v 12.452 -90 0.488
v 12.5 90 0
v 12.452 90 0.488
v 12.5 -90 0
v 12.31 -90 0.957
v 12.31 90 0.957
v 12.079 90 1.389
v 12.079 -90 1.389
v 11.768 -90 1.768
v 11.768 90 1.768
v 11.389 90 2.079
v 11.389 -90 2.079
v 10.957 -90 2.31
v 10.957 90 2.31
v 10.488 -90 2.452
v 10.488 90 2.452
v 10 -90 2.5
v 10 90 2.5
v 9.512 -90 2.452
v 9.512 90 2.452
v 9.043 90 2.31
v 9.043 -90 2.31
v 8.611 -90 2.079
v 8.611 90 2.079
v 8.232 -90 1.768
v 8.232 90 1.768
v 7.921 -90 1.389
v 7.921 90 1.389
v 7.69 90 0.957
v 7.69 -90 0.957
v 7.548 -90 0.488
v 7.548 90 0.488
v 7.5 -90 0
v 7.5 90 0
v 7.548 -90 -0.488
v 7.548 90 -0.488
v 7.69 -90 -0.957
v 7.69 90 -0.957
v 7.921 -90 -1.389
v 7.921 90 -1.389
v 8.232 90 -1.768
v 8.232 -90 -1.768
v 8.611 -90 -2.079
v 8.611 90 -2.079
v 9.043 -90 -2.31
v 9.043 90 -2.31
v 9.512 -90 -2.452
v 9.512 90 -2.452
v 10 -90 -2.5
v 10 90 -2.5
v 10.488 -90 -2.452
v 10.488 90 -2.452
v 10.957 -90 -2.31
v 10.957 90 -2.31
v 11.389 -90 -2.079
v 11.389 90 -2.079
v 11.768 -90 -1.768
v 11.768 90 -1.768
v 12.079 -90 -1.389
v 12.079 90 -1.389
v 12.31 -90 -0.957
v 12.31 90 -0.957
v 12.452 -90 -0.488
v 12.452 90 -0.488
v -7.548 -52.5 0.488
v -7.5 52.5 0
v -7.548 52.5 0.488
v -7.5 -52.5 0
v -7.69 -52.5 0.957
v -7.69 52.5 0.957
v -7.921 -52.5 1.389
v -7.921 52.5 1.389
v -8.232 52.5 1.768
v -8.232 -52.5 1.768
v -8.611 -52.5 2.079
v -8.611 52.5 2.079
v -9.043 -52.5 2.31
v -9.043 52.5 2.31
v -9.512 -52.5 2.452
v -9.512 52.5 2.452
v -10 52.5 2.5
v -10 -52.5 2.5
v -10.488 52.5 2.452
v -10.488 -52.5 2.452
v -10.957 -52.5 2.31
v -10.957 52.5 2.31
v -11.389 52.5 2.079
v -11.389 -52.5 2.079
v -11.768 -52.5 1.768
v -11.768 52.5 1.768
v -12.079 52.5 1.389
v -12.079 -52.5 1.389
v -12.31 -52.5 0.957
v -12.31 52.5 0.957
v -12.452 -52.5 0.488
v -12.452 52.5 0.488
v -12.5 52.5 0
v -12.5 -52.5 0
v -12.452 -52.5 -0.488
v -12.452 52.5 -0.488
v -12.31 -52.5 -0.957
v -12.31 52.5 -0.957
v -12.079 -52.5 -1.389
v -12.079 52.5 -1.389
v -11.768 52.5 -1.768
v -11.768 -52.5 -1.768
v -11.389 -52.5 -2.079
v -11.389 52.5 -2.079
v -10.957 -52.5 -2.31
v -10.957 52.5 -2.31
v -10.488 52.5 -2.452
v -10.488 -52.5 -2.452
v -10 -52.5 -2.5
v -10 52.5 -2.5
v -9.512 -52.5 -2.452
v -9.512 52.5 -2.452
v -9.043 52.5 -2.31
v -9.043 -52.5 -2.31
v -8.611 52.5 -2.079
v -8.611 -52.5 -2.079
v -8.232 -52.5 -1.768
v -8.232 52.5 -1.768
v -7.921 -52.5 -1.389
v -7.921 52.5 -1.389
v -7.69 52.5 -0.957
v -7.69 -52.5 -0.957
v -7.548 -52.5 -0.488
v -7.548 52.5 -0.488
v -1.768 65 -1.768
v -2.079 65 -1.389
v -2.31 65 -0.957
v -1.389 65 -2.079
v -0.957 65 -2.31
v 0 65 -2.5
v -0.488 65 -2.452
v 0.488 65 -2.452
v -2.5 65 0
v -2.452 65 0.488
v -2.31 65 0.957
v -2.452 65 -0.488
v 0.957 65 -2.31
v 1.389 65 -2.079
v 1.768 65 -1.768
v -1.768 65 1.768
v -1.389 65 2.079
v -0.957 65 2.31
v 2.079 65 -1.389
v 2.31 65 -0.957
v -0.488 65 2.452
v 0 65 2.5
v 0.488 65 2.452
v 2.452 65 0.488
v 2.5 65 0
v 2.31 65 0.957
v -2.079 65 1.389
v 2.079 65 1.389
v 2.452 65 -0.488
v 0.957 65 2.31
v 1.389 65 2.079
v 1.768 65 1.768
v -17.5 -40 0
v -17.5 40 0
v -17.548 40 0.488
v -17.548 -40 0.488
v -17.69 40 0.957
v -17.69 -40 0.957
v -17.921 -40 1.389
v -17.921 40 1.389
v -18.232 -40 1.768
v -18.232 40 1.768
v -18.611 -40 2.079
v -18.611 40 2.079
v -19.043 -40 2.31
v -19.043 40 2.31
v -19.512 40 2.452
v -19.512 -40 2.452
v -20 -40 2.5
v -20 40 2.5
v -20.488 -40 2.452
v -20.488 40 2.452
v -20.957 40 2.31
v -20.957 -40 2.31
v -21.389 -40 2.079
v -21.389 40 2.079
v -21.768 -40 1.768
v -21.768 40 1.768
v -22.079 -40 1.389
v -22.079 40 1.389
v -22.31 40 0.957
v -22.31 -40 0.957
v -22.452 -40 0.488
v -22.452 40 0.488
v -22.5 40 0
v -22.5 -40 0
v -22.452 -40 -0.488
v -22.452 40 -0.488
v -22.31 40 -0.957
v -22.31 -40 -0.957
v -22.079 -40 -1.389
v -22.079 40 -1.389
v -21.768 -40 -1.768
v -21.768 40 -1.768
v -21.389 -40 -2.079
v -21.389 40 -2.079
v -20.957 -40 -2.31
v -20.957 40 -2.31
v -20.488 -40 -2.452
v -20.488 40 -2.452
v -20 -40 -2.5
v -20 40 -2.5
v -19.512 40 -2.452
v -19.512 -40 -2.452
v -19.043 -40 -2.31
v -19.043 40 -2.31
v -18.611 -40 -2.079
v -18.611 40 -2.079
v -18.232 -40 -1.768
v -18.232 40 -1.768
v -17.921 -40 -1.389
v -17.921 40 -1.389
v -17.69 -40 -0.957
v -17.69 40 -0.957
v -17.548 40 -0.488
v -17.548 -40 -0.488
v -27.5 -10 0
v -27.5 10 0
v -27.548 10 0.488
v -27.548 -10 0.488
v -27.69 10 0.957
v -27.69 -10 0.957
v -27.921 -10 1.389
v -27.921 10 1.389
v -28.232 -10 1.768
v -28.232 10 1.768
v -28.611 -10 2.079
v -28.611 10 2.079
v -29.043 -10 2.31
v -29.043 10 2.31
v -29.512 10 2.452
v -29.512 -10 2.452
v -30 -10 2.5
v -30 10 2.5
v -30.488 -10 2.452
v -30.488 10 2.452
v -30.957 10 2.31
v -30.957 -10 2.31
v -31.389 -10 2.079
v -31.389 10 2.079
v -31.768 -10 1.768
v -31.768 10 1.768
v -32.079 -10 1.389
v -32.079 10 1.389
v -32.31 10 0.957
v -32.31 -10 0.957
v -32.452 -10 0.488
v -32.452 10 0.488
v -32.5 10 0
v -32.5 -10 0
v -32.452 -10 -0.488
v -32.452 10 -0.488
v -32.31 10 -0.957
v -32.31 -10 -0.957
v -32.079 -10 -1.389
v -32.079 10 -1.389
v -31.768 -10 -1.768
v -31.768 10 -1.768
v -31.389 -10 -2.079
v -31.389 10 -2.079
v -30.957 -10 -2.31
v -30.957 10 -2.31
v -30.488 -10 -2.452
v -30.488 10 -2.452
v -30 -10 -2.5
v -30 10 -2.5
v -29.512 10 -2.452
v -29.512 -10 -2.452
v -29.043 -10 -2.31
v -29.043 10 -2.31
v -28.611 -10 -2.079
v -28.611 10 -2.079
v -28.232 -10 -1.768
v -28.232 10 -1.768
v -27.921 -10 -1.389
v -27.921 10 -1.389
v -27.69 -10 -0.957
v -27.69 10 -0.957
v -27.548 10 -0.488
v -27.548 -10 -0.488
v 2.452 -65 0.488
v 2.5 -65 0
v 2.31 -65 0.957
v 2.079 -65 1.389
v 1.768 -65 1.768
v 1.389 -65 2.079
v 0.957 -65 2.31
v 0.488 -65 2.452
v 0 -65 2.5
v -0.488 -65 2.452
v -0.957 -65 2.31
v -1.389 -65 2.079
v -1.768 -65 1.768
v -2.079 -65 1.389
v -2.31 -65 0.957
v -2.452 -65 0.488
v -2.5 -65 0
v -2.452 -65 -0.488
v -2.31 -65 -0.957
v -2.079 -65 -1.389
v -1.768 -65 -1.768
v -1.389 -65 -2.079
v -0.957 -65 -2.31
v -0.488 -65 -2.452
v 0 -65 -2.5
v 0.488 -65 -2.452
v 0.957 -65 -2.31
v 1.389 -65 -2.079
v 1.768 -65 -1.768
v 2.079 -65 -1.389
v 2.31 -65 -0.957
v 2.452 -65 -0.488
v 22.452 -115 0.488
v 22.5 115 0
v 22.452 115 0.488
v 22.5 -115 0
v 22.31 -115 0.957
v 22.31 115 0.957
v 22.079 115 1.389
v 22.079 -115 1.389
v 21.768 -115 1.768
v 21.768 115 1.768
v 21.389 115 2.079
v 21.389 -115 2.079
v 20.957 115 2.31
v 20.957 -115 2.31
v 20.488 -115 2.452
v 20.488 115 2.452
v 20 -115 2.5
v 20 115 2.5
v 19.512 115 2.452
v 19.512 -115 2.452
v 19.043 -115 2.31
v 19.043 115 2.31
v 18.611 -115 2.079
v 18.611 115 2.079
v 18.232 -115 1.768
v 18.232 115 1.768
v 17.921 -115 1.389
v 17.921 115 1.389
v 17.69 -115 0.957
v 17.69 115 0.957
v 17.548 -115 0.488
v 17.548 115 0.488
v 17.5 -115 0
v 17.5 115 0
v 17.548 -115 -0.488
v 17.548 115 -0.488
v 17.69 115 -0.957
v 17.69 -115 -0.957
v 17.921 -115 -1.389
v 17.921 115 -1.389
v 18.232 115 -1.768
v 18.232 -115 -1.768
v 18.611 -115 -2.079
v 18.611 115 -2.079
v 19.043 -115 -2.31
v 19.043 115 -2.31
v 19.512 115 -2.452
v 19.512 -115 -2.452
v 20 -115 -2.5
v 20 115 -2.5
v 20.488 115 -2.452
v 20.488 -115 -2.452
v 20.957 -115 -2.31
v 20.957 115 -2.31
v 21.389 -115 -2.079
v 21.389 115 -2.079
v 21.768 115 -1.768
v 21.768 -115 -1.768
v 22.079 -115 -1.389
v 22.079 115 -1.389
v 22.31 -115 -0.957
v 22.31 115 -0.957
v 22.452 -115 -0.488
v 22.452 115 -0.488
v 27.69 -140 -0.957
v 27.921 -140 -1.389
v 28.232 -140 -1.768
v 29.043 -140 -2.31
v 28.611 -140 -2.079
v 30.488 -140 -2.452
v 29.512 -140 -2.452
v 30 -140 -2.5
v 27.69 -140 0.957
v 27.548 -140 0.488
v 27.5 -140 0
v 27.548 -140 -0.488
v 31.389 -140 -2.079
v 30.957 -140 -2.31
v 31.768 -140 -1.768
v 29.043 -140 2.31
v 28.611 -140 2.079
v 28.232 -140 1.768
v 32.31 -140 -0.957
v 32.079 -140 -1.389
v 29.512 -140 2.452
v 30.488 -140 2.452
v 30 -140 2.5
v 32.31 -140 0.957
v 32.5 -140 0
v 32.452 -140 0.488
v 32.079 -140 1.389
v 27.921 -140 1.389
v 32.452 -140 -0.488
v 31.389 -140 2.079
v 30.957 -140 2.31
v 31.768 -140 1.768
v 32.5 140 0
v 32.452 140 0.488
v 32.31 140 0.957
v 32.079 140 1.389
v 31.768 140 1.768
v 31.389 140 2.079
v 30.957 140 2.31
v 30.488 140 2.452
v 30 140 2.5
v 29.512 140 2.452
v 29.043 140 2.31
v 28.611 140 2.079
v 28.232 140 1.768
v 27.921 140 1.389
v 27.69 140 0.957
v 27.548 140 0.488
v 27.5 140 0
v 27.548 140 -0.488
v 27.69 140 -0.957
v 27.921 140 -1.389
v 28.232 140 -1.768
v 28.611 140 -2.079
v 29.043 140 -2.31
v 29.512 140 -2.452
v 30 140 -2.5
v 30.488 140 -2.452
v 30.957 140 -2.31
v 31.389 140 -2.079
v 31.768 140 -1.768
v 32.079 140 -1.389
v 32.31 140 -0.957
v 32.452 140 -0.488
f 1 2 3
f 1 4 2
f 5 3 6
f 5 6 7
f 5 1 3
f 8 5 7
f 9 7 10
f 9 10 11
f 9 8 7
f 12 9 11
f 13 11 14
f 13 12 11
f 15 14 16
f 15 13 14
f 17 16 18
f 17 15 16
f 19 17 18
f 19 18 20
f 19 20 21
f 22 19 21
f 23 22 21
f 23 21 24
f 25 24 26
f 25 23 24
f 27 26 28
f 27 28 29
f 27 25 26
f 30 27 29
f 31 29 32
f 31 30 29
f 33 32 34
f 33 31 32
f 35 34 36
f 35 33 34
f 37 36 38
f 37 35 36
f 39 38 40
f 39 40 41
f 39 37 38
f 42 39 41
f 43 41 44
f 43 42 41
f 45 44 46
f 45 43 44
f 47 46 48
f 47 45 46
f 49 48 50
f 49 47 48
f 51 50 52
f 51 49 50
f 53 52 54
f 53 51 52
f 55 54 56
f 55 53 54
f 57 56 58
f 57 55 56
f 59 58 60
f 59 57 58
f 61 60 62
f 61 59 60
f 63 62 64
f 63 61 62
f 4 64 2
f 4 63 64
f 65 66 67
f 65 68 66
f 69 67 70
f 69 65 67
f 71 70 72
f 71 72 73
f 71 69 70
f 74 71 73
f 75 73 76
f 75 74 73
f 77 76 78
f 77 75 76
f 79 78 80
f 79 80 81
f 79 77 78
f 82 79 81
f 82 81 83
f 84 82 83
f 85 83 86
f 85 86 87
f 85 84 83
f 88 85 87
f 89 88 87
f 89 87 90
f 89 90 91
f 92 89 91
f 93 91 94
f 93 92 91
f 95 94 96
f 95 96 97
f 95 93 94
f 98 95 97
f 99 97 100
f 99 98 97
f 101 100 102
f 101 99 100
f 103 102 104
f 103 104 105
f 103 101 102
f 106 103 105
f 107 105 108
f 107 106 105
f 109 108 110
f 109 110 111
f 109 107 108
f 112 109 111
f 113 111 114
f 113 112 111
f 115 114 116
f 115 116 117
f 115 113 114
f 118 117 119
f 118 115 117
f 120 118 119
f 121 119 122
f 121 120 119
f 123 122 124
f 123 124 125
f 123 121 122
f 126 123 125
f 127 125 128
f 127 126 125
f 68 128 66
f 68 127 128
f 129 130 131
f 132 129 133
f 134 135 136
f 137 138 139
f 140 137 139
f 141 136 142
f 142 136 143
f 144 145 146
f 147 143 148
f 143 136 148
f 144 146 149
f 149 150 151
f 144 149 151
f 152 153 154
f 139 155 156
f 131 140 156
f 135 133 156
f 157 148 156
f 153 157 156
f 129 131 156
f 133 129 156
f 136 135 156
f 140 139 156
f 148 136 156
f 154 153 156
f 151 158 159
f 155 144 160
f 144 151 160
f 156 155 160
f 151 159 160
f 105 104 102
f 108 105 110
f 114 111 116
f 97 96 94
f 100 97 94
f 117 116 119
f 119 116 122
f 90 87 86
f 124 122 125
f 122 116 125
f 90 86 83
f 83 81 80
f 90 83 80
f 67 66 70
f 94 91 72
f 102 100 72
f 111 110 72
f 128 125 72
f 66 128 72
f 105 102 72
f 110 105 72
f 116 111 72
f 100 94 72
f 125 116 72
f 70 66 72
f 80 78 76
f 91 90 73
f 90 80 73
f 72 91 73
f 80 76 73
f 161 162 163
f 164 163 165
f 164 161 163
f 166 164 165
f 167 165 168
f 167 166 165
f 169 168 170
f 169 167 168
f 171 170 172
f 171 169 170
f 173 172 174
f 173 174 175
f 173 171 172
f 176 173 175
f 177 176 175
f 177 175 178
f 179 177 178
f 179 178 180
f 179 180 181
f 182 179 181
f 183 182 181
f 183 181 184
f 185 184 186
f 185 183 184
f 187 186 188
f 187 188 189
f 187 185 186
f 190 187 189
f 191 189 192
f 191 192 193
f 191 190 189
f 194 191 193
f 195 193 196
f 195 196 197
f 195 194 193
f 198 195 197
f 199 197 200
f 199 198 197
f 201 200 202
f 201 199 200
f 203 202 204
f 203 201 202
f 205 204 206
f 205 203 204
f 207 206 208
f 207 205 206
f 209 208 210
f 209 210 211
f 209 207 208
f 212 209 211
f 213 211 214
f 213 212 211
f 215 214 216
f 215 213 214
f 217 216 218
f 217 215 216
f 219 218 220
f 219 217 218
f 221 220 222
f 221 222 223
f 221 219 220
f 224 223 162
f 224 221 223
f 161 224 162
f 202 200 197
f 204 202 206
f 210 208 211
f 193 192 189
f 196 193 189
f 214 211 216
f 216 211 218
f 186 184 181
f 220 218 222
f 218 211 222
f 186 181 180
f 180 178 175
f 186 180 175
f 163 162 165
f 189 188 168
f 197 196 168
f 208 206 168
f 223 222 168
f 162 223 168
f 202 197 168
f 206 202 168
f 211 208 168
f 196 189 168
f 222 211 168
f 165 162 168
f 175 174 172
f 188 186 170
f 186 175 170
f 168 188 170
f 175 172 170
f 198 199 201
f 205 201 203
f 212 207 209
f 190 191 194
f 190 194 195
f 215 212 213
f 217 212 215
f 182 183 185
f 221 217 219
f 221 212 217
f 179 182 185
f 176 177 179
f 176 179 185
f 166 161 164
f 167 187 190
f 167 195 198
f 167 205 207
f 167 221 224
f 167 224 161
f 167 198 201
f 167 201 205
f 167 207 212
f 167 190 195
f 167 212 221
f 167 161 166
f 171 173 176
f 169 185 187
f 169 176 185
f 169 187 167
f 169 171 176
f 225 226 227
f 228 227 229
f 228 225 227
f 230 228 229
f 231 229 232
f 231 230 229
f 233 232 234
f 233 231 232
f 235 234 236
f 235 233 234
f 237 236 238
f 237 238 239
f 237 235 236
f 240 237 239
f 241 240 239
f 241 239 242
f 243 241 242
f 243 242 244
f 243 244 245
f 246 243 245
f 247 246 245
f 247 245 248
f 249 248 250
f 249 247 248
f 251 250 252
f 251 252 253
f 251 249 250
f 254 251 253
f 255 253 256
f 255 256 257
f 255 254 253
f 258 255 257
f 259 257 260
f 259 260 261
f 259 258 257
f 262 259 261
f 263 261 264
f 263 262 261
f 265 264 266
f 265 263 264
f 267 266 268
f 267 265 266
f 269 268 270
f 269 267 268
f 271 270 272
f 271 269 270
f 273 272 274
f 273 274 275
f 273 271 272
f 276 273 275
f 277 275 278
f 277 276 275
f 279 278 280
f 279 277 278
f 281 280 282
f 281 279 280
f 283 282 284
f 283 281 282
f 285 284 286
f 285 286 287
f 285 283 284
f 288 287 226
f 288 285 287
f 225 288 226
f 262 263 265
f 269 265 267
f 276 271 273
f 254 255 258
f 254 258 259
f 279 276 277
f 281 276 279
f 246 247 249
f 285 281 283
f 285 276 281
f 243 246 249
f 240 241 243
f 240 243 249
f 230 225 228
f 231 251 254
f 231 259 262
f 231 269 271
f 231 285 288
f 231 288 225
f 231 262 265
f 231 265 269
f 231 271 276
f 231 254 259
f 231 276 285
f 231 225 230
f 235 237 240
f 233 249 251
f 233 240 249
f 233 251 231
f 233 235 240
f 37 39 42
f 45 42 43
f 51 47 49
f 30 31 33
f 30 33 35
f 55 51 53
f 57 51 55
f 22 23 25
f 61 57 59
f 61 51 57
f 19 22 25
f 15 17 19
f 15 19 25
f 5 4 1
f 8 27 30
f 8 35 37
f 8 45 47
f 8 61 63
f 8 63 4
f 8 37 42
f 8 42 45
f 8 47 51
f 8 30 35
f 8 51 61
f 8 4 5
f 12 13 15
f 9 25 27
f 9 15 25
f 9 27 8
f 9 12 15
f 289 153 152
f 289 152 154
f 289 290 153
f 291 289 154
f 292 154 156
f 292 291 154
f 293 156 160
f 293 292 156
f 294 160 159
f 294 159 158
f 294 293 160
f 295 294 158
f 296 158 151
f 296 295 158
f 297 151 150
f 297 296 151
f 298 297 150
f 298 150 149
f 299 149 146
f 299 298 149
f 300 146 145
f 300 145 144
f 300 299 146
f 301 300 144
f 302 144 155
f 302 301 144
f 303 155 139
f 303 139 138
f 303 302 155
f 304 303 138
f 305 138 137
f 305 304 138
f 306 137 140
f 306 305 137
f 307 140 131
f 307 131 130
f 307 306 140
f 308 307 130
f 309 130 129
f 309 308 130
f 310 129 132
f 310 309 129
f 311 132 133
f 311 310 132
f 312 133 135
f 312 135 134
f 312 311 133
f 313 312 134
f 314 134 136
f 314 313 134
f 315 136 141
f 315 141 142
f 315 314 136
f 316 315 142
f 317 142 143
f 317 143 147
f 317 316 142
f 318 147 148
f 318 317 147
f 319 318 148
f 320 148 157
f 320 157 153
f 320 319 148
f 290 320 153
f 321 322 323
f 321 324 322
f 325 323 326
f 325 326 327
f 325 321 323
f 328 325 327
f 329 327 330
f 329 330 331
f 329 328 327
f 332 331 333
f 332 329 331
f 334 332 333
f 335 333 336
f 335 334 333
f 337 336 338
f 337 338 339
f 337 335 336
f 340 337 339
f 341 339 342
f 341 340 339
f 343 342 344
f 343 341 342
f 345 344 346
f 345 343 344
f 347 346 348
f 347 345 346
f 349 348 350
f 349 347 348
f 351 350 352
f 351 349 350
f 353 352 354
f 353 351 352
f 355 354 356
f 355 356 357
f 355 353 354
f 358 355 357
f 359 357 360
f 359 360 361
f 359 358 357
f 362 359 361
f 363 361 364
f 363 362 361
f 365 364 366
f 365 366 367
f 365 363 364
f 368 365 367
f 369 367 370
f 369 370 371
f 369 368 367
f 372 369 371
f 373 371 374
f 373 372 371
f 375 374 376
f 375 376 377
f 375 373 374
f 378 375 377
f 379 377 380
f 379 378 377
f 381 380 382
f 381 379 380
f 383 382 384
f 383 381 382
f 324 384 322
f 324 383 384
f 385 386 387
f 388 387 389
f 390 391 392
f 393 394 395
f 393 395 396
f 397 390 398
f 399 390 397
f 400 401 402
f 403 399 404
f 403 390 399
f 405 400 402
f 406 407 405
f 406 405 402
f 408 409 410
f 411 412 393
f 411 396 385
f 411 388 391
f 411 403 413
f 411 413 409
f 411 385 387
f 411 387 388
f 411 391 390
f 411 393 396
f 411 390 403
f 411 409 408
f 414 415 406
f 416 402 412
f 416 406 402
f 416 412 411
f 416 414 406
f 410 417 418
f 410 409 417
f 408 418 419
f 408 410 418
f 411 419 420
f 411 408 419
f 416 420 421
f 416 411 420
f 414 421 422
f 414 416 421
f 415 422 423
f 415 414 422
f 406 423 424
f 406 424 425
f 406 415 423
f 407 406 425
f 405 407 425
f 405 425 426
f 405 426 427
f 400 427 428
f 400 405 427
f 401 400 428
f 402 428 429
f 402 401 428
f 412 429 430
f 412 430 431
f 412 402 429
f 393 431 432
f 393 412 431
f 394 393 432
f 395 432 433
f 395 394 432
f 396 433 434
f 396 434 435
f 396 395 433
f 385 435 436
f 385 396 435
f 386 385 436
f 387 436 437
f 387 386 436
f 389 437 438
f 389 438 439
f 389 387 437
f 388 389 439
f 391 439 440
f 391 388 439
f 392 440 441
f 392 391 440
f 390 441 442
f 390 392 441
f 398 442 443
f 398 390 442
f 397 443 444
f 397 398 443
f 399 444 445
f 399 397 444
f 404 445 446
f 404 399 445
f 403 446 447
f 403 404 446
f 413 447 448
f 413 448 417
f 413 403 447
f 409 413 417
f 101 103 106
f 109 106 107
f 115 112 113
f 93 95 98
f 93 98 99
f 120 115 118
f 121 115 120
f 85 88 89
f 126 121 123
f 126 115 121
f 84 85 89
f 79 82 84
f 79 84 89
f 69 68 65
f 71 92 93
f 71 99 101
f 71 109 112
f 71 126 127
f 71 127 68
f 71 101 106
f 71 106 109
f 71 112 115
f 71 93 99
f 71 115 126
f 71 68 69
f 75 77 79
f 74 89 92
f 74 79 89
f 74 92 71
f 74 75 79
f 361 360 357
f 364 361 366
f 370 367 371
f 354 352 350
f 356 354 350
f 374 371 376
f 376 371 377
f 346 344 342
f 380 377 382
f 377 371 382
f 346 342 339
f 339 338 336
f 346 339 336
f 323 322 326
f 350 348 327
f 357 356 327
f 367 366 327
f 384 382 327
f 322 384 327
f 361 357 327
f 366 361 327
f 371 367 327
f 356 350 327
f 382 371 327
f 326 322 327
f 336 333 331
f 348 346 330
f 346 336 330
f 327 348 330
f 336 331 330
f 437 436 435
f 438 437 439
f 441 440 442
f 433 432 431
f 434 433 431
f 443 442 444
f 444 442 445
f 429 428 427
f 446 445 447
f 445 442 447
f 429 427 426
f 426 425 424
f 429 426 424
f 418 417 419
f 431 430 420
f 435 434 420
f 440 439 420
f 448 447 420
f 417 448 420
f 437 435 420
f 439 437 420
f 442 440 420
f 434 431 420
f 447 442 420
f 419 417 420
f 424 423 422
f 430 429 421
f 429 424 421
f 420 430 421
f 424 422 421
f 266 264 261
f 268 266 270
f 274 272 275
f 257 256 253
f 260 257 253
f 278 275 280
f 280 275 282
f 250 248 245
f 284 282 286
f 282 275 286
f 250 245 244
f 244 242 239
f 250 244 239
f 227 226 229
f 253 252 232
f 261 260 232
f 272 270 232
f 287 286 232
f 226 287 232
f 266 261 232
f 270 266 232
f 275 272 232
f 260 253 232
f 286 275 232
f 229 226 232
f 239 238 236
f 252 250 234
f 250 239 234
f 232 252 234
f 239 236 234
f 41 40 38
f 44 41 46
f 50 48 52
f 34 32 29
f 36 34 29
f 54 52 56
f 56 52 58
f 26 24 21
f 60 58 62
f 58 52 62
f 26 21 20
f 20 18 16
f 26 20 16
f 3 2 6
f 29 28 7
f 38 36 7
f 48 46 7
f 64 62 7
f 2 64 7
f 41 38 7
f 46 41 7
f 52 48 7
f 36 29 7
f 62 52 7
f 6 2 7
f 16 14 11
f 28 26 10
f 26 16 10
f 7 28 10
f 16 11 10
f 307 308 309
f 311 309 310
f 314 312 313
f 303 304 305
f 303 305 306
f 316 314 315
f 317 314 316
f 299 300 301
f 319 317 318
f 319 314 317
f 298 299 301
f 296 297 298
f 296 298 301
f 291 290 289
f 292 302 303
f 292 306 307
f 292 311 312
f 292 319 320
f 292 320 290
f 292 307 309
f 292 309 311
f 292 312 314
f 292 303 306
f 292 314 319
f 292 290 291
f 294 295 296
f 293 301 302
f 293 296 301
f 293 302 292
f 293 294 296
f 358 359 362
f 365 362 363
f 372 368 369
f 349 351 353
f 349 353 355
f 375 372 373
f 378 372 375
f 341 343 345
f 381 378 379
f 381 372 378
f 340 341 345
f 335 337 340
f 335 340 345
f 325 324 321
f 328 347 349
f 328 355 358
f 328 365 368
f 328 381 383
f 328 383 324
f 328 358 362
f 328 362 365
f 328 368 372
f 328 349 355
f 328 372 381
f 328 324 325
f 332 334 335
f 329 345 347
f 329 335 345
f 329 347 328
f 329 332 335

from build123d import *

# Parameters (mm, degrees)
F0_R     = 2.5
F1_DEPTH = 10
F2_DEPTH = 40
F3_DEPTH = 52.5
F4_DEPTH = 65
F5_DEPTH = 90
F6_DEPTH = 115
F7_DEPTH = 140


with BuildPart() as f1:
    # F0 (on Front) → F1 (new body, symmetric)
    with BuildSketch(Plane.XZ):
        with Locations((-30, 0)):
            Circle(F0_R)
    extrude(amount=F1_DEPTH, both=True)


with BuildPart() as f2:
    # F0 (on Front) → F2 (new body, symmetric)
    with BuildSketch(Plane.XZ):
        with Locations((-20, 0)):
            Circle(F0_R)
    extrude(amount=F2_DEPTH, both=True)


with BuildPart() as f3:
    # F0 (on Front) → F3 (new body, symmetric)
    with BuildSketch(Plane.XZ):
        with Locations((-10, 0)):
            Circle(F0_R)
    extrude(amount=F3_DEPTH, both=True)


with BuildPart() as f4:
    # F0 (on Front) → F4 (new body, symmetric)
    with BuildSketch(Plane.XZ):
        Circle(F0_R)
    extrude(amount=F4_DEPTH, both=True)


with BuildPart() as f5:
    # F0 (on Front) → F5 (new body, symmetric)
    with BuildSketch(Plane.XZ):
        with Locations((10, 0)):
            Circle(F0_R)
    extrude(amount=F5_DEPTH, both=True)


with BuildPart() as f6:
    # F0 (on Front) → F6 (new body, symmetric)
    with BuildSketch(Plane.XZ):
        with Locations((20, 0)):
            Circle(F0_R)
    extrude(amount=F6_DEPTH, both=True)


with BuildPart() as f7:
    # F0 (on Front) → F7 (new body, symmetric)
    with BuildSketch(Plane.XZ):
        with Locations((30, 0)):
            Circle(F0_R)
    extrude(amount=F7_DEPTH, both=True)


solid = Compound([f1.part, f2.part, f3.part, f4.part, f5.part, f6.part, f7.part])
